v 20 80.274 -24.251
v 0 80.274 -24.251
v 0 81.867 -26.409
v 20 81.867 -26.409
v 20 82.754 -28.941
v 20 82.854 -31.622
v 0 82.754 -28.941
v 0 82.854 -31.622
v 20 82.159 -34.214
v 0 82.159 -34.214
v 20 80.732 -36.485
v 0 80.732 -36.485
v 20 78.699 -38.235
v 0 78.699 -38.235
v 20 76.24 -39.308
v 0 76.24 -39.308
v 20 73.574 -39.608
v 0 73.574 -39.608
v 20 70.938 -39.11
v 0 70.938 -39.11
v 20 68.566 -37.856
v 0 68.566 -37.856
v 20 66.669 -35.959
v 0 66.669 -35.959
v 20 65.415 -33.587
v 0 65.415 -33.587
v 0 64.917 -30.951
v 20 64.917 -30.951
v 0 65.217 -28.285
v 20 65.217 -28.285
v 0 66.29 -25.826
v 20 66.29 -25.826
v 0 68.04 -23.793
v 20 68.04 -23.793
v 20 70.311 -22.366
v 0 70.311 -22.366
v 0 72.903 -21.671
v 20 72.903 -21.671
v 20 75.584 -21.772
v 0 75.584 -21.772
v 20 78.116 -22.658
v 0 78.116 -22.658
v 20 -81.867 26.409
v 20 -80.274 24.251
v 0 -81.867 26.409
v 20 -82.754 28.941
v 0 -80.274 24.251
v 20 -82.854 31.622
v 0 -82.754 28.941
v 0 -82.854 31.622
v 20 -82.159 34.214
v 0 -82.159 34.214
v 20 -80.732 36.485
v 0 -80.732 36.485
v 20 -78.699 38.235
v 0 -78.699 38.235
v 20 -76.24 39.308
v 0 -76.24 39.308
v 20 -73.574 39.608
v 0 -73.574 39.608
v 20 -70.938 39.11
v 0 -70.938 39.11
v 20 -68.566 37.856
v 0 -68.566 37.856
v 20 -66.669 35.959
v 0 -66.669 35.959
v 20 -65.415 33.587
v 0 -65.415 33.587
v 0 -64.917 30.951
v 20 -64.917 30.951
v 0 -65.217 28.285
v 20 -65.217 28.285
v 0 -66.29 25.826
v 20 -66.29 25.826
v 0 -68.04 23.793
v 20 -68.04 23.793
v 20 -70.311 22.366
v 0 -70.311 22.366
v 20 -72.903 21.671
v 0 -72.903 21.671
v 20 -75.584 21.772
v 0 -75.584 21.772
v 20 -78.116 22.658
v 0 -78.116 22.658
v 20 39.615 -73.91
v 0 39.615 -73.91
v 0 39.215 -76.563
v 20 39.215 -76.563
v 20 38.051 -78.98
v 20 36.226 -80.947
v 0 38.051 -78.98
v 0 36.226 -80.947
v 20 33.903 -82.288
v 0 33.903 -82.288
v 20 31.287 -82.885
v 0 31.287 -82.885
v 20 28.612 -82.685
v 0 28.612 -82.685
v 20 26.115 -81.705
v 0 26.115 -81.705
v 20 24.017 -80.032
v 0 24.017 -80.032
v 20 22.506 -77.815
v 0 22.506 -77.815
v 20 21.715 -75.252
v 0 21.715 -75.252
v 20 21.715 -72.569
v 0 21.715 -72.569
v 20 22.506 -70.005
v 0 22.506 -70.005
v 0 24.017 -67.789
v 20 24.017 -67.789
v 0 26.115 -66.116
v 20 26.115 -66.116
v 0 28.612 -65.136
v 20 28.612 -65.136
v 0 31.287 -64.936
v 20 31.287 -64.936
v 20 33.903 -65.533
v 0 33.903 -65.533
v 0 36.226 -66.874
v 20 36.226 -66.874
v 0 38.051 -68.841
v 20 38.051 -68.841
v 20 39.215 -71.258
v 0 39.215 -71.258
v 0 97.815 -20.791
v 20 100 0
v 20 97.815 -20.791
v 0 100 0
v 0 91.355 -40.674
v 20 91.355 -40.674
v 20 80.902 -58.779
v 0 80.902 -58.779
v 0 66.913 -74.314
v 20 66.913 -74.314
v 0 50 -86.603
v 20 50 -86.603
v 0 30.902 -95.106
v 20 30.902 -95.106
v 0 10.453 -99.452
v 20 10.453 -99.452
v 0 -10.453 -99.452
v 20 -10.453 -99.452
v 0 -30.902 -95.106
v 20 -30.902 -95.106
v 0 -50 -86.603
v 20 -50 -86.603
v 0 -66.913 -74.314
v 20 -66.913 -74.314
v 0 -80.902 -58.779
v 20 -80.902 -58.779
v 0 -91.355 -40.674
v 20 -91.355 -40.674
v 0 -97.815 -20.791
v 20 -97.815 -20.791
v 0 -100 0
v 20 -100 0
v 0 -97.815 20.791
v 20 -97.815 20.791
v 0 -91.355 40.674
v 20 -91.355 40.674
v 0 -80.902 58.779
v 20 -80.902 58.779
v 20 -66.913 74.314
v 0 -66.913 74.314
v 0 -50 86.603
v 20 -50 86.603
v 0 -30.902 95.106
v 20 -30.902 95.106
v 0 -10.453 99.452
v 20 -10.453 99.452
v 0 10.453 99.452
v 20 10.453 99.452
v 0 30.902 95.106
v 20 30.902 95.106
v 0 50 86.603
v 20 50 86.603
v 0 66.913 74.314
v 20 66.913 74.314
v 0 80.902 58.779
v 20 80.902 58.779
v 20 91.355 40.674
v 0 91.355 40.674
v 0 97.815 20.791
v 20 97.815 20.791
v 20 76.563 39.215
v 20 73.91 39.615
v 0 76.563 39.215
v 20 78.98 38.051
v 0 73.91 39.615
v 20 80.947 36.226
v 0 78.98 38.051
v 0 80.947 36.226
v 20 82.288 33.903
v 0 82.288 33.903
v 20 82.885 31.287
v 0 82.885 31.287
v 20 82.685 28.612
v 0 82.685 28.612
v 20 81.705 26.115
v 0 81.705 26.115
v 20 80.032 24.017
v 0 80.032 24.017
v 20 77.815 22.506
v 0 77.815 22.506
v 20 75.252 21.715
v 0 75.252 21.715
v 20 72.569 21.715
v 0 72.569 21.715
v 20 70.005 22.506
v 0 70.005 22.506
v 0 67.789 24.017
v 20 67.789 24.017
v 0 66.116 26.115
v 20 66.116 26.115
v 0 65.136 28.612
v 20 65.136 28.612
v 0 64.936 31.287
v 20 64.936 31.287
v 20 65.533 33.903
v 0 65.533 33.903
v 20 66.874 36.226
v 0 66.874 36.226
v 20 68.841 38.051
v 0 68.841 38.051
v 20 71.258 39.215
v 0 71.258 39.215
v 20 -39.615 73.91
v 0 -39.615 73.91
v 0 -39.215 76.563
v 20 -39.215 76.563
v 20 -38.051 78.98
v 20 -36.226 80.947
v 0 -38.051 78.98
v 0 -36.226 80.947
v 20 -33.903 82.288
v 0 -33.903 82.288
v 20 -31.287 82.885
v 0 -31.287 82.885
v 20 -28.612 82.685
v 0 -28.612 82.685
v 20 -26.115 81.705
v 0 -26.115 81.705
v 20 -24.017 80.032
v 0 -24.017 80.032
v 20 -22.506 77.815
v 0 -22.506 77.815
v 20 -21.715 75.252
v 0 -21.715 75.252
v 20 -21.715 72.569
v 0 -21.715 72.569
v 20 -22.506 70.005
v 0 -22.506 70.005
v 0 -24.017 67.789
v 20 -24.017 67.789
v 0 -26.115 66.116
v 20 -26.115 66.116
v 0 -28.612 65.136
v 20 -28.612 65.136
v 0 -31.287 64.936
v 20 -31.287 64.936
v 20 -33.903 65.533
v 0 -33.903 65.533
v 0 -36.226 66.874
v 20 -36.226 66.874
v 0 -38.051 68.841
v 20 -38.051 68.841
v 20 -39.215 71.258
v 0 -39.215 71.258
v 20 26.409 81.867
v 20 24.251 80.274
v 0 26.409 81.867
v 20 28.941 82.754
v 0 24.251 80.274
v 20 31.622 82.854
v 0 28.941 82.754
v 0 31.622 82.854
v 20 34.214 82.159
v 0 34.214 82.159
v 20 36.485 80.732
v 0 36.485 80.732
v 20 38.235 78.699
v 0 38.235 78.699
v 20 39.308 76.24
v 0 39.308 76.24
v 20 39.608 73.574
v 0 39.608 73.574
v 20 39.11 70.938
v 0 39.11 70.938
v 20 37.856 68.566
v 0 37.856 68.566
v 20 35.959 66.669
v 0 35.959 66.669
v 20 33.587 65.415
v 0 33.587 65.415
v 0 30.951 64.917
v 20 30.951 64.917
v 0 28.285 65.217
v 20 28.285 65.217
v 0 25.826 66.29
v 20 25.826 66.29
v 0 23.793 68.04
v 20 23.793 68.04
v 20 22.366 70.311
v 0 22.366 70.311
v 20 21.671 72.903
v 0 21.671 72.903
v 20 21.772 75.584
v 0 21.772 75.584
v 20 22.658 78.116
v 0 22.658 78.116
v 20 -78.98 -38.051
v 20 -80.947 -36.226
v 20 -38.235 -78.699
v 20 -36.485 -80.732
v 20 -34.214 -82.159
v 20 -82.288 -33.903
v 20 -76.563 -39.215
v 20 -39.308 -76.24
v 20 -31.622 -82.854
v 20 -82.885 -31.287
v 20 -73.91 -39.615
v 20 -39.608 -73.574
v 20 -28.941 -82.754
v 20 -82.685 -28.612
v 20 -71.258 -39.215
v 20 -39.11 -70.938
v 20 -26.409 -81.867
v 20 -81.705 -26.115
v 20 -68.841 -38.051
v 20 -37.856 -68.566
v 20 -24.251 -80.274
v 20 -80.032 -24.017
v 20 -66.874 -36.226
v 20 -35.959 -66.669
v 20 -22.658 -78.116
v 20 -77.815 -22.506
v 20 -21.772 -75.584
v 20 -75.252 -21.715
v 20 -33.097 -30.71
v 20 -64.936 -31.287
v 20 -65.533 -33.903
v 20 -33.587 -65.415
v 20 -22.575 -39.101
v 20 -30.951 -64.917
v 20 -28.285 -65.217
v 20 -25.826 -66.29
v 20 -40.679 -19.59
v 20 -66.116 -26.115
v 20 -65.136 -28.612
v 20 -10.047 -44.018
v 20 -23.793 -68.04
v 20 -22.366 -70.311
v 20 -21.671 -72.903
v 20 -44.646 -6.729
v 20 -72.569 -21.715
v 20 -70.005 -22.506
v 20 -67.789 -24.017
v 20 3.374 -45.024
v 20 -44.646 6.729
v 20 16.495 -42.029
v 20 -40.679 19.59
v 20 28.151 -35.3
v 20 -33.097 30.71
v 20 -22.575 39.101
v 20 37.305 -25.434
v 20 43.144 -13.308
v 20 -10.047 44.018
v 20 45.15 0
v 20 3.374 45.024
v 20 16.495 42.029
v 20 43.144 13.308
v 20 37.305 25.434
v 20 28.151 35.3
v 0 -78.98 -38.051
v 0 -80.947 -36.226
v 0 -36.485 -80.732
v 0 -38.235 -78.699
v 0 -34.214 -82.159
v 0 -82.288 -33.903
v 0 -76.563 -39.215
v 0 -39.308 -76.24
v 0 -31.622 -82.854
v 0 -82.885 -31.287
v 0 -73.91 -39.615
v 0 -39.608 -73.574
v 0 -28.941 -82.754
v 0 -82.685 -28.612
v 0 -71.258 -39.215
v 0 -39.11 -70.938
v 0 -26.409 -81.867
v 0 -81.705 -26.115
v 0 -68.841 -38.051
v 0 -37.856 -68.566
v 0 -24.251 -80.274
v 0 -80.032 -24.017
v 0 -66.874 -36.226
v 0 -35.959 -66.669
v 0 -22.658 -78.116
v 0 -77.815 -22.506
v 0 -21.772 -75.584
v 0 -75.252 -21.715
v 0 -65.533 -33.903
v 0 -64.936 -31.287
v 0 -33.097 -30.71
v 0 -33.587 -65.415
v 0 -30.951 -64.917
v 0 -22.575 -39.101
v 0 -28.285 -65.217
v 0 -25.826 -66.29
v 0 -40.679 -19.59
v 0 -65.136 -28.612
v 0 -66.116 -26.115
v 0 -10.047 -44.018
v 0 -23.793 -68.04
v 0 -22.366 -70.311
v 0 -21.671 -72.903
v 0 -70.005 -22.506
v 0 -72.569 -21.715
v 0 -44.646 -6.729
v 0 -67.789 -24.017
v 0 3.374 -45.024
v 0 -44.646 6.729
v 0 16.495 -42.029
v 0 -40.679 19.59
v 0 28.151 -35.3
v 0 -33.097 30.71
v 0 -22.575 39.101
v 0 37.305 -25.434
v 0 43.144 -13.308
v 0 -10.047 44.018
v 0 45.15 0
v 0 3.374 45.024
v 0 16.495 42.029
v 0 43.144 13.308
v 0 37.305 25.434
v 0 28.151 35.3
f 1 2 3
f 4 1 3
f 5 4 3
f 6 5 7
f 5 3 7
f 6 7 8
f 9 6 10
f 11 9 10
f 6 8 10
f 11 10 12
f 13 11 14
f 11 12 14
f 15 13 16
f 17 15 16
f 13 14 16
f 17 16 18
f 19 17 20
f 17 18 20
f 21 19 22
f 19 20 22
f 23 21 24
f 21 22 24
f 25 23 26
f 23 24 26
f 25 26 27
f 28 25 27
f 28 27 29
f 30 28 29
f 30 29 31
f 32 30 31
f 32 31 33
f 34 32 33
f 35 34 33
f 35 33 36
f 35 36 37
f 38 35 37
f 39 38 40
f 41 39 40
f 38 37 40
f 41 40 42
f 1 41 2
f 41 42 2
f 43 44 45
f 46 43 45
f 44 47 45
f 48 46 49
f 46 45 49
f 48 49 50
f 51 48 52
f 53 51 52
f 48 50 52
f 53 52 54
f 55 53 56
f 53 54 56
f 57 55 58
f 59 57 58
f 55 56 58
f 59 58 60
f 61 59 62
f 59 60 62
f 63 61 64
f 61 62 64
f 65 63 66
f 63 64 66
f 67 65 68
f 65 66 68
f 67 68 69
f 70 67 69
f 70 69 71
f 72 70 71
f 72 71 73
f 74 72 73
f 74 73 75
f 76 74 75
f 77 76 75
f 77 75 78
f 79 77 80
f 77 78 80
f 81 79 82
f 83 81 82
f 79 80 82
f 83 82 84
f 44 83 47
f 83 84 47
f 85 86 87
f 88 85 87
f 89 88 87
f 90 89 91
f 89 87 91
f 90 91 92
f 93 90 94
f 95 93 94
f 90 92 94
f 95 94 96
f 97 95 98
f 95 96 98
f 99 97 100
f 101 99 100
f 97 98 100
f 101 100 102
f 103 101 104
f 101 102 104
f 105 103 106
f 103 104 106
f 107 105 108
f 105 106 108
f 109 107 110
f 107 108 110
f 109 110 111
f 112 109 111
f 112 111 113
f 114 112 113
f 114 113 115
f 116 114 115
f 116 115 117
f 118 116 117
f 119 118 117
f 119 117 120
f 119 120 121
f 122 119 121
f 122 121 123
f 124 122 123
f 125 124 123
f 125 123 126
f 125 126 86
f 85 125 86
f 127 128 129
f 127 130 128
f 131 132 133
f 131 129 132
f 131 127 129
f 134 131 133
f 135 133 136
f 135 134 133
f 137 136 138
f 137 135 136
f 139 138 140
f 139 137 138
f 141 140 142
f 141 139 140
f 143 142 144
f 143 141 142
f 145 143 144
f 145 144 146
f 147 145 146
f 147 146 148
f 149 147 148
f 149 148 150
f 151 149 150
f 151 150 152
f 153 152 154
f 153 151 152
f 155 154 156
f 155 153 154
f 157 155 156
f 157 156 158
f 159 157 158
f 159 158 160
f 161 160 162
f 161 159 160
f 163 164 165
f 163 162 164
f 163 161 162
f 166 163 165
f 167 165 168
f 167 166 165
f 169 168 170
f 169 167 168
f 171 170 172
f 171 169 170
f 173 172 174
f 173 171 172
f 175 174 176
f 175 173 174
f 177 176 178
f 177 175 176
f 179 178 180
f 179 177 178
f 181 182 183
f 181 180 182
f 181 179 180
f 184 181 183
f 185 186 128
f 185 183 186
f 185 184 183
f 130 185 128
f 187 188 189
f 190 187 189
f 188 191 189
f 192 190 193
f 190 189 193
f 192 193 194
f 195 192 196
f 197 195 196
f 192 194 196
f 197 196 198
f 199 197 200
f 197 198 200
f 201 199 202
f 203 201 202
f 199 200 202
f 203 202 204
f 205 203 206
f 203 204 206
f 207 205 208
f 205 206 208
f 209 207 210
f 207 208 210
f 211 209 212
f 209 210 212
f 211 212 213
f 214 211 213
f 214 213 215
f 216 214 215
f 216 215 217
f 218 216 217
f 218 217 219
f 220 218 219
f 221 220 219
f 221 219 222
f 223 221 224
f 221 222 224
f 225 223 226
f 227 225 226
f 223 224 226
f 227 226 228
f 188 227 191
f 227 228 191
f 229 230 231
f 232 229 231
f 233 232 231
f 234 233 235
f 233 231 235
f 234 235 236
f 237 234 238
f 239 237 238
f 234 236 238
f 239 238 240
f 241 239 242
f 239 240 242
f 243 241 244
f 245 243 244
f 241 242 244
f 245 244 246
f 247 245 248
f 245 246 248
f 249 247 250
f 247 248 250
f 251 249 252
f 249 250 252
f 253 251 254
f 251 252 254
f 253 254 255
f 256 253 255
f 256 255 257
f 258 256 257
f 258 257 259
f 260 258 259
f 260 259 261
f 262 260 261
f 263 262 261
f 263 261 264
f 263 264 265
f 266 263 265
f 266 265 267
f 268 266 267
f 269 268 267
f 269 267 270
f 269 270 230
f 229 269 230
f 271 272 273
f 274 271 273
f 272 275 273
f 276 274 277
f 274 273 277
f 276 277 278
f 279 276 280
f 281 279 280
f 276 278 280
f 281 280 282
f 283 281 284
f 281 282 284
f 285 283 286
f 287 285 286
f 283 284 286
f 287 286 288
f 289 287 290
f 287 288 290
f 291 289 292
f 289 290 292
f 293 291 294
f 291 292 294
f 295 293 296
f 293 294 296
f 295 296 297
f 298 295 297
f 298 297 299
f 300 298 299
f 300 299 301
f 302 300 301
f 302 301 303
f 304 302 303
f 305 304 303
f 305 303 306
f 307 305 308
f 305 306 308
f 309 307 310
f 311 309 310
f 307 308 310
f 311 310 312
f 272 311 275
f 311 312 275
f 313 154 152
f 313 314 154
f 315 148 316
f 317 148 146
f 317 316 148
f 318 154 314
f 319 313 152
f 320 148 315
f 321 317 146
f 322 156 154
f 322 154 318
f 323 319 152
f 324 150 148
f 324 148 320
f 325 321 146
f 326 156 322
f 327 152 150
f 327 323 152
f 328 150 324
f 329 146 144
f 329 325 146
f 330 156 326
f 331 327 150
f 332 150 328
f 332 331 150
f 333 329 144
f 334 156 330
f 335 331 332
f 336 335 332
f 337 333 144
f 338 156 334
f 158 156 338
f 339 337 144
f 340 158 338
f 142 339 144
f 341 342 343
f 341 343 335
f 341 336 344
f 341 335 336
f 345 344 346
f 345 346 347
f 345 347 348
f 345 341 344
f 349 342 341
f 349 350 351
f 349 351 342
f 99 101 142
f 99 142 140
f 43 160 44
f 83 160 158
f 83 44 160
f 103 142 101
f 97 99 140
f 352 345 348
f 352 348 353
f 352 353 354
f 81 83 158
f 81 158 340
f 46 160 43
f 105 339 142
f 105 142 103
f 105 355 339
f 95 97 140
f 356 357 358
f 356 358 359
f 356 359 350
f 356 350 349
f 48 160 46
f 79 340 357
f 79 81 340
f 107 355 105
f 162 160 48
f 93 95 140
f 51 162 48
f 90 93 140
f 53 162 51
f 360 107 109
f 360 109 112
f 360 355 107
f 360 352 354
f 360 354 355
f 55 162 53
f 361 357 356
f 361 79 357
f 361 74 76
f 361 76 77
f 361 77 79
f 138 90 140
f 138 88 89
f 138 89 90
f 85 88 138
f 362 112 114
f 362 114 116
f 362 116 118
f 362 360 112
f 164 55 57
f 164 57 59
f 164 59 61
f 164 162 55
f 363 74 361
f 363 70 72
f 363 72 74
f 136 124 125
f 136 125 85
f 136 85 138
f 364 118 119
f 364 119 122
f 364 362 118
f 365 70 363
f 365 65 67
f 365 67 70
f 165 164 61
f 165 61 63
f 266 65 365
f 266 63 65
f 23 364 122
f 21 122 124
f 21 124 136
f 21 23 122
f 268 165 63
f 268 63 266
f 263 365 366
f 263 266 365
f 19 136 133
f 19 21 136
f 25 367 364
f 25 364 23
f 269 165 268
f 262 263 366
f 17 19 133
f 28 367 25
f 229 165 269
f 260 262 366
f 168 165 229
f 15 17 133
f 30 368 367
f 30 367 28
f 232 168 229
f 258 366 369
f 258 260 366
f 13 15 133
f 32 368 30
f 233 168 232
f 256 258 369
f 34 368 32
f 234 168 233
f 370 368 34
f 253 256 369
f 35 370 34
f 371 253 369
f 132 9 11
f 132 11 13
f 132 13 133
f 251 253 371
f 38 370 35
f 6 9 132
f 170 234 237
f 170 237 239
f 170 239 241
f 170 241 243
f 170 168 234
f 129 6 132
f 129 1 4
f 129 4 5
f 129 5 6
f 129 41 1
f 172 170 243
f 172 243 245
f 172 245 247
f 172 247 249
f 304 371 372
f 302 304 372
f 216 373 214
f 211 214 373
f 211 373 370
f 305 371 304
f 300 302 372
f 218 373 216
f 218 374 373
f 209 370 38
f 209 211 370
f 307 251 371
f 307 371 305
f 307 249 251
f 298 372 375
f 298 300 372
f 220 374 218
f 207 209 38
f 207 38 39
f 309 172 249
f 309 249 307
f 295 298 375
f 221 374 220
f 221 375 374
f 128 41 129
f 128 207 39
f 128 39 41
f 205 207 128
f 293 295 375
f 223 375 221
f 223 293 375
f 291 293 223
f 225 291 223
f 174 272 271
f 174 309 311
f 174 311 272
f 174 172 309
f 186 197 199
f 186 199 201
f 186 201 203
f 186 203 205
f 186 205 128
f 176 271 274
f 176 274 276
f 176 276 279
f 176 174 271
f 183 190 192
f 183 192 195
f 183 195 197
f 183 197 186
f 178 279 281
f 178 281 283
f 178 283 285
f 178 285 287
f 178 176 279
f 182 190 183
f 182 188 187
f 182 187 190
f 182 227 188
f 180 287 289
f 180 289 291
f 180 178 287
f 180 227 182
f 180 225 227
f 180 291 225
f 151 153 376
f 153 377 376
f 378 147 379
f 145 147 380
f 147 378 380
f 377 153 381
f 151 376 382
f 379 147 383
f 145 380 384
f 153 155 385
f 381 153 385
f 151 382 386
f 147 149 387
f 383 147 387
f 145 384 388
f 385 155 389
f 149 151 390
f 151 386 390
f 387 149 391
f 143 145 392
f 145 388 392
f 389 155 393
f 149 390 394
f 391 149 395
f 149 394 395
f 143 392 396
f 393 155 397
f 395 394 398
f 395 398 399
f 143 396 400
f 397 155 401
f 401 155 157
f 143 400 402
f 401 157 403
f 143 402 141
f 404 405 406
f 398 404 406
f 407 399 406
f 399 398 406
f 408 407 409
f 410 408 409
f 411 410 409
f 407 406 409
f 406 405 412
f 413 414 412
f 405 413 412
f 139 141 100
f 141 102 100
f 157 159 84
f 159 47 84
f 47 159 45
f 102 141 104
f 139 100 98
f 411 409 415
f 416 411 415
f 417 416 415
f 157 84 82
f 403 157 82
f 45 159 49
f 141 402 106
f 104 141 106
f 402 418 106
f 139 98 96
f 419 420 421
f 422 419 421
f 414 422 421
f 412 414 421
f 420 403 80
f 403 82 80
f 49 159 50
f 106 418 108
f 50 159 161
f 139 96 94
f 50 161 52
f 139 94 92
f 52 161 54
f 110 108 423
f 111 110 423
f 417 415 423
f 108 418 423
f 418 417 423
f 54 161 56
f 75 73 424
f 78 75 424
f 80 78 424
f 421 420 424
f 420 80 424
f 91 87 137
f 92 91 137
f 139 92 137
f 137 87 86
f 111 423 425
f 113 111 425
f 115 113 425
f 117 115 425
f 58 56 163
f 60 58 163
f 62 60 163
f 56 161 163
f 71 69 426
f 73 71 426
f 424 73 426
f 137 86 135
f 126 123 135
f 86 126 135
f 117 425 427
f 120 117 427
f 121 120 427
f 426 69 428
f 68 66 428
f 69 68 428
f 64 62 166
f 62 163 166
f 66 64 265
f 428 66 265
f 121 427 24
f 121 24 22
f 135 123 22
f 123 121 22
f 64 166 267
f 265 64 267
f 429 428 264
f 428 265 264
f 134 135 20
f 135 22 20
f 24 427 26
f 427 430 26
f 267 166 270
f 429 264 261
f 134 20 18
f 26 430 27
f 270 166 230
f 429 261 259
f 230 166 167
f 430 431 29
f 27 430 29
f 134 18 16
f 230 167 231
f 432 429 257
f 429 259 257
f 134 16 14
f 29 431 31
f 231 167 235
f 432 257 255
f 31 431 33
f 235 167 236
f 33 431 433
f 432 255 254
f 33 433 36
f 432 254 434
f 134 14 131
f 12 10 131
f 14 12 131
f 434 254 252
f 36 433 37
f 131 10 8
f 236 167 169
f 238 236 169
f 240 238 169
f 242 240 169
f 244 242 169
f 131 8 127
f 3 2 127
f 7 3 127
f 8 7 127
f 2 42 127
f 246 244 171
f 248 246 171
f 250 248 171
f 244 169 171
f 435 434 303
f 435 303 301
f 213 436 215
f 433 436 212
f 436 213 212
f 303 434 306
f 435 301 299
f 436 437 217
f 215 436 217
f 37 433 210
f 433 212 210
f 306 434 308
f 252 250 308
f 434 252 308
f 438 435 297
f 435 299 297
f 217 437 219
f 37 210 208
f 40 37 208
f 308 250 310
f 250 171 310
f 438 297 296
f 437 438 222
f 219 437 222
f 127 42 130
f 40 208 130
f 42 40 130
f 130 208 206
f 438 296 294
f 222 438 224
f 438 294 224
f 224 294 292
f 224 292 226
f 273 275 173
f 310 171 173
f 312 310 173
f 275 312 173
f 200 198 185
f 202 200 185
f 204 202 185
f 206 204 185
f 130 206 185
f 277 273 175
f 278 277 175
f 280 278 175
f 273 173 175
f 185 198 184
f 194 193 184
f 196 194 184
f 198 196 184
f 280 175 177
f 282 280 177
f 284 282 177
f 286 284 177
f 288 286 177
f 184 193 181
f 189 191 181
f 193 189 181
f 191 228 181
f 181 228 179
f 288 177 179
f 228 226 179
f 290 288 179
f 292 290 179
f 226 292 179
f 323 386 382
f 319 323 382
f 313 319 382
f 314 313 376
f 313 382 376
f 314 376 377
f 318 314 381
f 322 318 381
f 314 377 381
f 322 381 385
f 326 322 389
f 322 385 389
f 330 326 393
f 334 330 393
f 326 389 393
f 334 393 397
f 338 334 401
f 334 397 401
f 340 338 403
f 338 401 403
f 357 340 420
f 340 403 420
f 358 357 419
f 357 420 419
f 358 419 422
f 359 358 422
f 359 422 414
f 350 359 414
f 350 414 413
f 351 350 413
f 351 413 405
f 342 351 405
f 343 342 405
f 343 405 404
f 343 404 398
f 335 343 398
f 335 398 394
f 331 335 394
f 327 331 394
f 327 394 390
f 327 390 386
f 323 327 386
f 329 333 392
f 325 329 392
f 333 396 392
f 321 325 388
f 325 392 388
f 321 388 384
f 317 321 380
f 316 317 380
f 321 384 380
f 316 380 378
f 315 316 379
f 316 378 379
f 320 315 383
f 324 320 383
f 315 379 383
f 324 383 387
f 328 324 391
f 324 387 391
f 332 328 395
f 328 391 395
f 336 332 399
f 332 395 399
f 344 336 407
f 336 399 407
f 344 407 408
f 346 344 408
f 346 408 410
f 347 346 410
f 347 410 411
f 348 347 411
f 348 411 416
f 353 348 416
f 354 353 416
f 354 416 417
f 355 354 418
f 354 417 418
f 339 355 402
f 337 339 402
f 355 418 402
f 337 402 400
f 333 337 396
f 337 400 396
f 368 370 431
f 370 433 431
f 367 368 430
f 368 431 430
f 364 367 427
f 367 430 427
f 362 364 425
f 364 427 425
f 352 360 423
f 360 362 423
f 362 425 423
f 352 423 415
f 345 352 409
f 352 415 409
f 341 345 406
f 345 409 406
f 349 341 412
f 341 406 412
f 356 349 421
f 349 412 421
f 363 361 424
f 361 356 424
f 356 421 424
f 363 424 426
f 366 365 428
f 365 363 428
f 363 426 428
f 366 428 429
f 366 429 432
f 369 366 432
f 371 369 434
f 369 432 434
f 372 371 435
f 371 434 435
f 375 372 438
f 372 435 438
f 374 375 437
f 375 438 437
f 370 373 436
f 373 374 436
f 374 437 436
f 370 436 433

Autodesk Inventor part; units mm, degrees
ref_plane "YZ Plane" through (0, 0, 0) normal (1, 0, 0) x (0, 1, 0)
ref_plane "XZ Plane" through (0, 0, 0) normal (0, 1, 0) x (-1, 0, 0)
ref_plane "XY Plane" through (0, 0, 0) normal (0, 0, 1) x (1, 0, 0)
sketch "Sketch1" plane through (0, 0, 0) normal (0, 0, 1) x (1, 0, 0)
  line L0 (20, 100) -> (0, 100)
  line L1 (0, 100) -> (0, 45.15)
  line L2 (0, 45.15) -> (0, 0) construction
  line L3 (0, 0) -> (20, 0) construction
  line L4 (20, 100) -> (20, 45.15)
  line L5 (20, 45.15) -> (0, 45.15)
  line L6 (20, 45.15) -> (20, 0) construction
  dimension "d0" = 200
  dimension "d1" = 20
  dimension "d5" = 90.3
revolve "Revolution1" add sketch "Sketch1" angle 360 about axis through (0, 0, 0) along (1, 0, 0)
sketch "Sketch2" plane through (0, 0, 0) normal (-1, 0, 0) x (0, 0, 1)
  circle A0 centre (0, 0) radius 45.15 projected
  line L0 (0, 80) -> (0, 0) construction
  circle A1 centre (0, 0) radius 100 projected
  circle A2 centre (0, 0) radius 80 construction
  line L1 (0, 0) -> (30.6147, 73.9104) construction
  circle A3 centre (30.6147, 73.9104) radius 9
  dimension "d6" = 18
  dimension "d7" = 80
  dimension "d8" = 22.5
extrude "Extrusion1" cut sketch "Sketch2" against normal through all contours A3
pattern_circular "Circular Pattern1" count 8 over 360 about axis through (10, 0, 0) along (1, 0, 0) of "Extrusion1"
equation "\"d6\" = dd2"
equation "\"d7\" = 0.5 * k"
equation "\"d0\" = D"
equation "\"d1\" = b"
equation "\"d5\" = dd5"
equation "\"b\" = 20"
equation "\"D\" = 200"
equation "\"dd2\" = 18"
equation "\"dd5\" = 90.3"
equation "\"Size_Designation\" = 1.2345"
equation "\"k\" = 160"
properties part number "DIN 2576 Slip-On Flange for Welding Series 1 (ISO) - PN 10 80 x 88.9" material "Steel"
